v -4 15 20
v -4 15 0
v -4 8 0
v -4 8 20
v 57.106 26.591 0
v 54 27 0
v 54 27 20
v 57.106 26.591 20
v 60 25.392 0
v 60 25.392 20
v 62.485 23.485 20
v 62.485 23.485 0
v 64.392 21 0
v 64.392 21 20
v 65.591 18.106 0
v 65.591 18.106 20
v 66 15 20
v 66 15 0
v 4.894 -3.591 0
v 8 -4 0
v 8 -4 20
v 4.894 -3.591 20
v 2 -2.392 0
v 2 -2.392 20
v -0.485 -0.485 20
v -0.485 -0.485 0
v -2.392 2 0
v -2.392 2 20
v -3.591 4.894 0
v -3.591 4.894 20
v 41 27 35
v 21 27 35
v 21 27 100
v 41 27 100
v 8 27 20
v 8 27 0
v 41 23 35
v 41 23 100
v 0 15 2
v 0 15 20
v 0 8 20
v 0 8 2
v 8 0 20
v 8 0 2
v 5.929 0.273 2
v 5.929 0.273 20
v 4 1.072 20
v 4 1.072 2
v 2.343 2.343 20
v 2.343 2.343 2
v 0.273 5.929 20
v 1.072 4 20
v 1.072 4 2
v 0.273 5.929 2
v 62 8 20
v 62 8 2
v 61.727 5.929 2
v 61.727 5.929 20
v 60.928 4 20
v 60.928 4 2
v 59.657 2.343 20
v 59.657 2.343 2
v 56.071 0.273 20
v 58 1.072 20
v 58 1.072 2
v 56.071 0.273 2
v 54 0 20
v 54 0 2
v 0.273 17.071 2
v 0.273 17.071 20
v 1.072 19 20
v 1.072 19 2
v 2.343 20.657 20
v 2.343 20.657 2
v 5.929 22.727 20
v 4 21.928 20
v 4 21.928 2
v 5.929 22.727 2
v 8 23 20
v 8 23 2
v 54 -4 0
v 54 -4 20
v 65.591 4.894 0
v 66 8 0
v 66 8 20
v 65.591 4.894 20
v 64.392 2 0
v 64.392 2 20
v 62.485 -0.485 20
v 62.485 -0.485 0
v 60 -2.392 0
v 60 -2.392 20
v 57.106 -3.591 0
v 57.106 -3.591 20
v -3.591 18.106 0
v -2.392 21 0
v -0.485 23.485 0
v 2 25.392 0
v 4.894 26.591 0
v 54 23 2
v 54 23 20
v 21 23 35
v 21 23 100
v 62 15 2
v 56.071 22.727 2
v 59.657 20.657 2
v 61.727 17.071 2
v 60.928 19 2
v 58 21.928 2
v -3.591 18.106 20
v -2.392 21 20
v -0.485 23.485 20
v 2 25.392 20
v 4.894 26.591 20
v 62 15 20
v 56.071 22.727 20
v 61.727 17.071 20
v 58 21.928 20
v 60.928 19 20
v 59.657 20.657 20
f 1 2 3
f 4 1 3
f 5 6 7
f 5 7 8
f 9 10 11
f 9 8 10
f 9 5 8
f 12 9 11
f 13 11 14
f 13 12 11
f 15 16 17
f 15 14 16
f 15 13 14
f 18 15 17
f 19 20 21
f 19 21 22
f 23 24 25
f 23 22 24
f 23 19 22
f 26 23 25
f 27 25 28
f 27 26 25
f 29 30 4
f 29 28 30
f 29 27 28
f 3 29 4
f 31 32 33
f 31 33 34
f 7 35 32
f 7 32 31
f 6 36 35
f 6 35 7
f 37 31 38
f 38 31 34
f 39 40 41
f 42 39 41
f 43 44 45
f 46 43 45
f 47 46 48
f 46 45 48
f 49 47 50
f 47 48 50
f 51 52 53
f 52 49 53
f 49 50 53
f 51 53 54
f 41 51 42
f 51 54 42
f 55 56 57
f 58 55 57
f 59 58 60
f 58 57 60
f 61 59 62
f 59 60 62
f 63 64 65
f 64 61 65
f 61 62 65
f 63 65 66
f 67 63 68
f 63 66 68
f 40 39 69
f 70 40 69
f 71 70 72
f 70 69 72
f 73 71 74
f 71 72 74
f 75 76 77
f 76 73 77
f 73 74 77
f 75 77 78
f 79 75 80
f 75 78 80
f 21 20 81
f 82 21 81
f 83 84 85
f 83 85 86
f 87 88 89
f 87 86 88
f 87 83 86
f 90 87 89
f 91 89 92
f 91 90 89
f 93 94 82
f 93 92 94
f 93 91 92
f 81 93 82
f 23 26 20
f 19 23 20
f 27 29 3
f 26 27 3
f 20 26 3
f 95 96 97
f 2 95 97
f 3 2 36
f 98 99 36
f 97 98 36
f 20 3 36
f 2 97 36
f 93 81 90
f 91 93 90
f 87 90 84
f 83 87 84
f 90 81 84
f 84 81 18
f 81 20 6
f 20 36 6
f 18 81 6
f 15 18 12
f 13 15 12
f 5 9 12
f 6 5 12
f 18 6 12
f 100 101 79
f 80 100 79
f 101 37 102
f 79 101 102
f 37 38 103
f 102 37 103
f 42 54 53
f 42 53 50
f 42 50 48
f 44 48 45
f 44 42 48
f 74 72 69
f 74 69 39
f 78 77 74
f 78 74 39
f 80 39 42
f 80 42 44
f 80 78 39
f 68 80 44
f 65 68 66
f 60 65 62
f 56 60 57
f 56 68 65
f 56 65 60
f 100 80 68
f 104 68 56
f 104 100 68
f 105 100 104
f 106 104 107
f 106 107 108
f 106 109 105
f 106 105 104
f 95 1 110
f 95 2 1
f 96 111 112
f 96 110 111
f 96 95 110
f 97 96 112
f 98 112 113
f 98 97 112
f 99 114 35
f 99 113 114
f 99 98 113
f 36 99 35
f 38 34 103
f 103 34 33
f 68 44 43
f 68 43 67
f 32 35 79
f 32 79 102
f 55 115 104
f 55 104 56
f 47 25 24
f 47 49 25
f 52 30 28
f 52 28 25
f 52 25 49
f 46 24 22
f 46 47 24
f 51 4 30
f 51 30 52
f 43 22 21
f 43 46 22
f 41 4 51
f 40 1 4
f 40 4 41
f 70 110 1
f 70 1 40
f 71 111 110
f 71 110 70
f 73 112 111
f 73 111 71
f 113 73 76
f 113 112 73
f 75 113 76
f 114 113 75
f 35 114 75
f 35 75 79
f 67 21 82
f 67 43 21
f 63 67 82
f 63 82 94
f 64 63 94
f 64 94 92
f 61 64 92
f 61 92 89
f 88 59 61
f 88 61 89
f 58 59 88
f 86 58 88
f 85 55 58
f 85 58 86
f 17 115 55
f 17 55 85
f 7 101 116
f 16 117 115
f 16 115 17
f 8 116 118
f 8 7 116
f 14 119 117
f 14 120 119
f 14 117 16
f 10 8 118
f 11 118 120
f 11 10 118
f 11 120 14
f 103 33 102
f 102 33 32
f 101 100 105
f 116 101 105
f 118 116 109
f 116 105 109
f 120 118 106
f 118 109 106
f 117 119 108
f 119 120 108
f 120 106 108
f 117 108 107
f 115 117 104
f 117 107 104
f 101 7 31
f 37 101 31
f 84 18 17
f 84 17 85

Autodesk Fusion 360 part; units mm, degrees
sketch "Schizzo1" plane through (0, 0, 0) normal (0, 0, 1) x (1, 0, 0)
  line L0 (0, 0) -> (62, 0) construction
  line L1 (62, 0) -> (62, 23) construction
  line L2 (62, 23) -> (0, 23) construction
  line L3 (0, 23) -> (0, 0) construction
  line L4 (31, 23) -> (31, 0) construction
  line L5 (62, 23) -> (54, 23) construction
  line L6 (54, 23) -> (54, 0) construction
  line L7 (0, 23) -> (8, 23) construction
  line L8 (8, 23) -> (8, 0) construction
  line L9 (8, 0) -> (54, 0)
  line L10 (8, 23) -> (54, 23)
  line L11 (0, 23) -> (0, 15) construction
  line L12 (0, 15) -> (62, 15) construction
  line L13 (0, 0) -> (0, 8) construction
  line L14 (0, 8) -> (62, 8) construction
  line L15 (0, 15) -> (0, 8) construction
  line L16 (0, 15) -> (0, 8)
  line L17 (62, 15) -> (62, 8)
  arc A0 (8, 23) -> (0, 15) centre (8, 15) ccw
  arc A1 (0, 8) -> (8, 0) centre (8, 8) ccw
  arc A2 (54, 0) -> (62, 8) centre (54, 8) ccw
  arc A3 (62, 15) -> (54, 23) centre (54, 15) ccw
  arc A4 (66, 15) -> (54, 27) centre (54, 15) ccw
  line L18 (8, 27) -> (54, 27)
  arc A5 (8, 27) -> (-4, 15) centre (8, 15) ccw
  line L19 (-4, 15) -> (-4, 8)
  arc A6 (-4, 8) -> (8, -4) centre (8, 8) ccw
  line L20 (8, -4) -> (54, -4)
  arc A7 (54, -4) -> (66, 8) centre (54, 8) ccw
  line L21 (66, 15) -> (66, 8)
  line L22 (0, 11.5) -> (62, 11.5) construction
  line L23 (0, 11.5) -> (-4, 11.5) construction
  line L24 (62, 11.5) -> (66, 11.5) construction
  dimension "d10" = 62
  dimension "d11" = 23
  dimension "d12" = 8
  dimension "d13" = 8
  dimension "d15" = 8
  dimension "d16" = 8
  dimension "d17" = -4
  dimension "d32" = 70
  dimension "d33" = 31
extrude "Estrusione2" add sketch "Schizzo1" along normal blind 20
extrude "Estrusione4" add sketch "Schizzo1" along normal blind 2 contours L9 L10 L16 L17 A0 A1 A2 A3
sketch "Schizzo3" plane through (0, 27, 0) normal (0, 1, 0) x (-1, 0, 0)
  line L0 (-54, 0) -> (-8, 0)
  line L1 (-8, 0) -> (-8, 20)
  line L2 (-8, 20) -> (-54, 20)
  line L3 (-54, 20) -> (-54, 0)
  line L4 (-31, 20) -> (-31, 100) construction
  line L5 (-31, 60) -> (-21, 60) construction
  line L6 (-21, 20) -> (-41, 20)
  line L7 (-41, 20) -> (-41, 100)
  line L8 (-41, 100) -> (-21, 100)
  line L9 (-21, 100) -> (-21, 20)
  line L10 (-21, 20) -> (-41, 100) construction
  line L11 (-41, 20) -> (-21, 100) construction
  point P0 (-31, 60)
  dimension "d22" = 20
  dimension "d23" = 80
extrude "Estrusione3" add sketch "Schizzo3" against normal blind 4 contours L2 L6 L7 L8 L9
sketch "Schizzo4" plane through (0, 27, 0) normal (0, 1, 0) x (-1, 0, 0)
  line L0 (-54, 0) -> (-8, 0)
  line L1 (-8, 0) -> (-8, 20)
  line L2 (-8, 20) -> (-21, 20)
  line L3 (-21, 20) -> (-21, 100)
  line L4 (-21, 100) -> (-41, 100)
  line L5 (-41, 100) -> (-41, 20)
  line L6 (-41, 20) -> (-54, 20)
  line L7 (-54, 20) -> (-54, 0)
  line L8 (-54, 20) -> (-41, 35)
  line L9 (-31, 100) -> (-31, -12.8301) construction
  line L10 (-8, 20) -> (-21, 35)
extrude "Estrusione5" add sketch "Schizzo4" against normal blind 4 contours L5 L6 L8 | L2 L3 L10
equation "d12 = d13"
equation "d15 = d13"
equation "d16 = d13"
